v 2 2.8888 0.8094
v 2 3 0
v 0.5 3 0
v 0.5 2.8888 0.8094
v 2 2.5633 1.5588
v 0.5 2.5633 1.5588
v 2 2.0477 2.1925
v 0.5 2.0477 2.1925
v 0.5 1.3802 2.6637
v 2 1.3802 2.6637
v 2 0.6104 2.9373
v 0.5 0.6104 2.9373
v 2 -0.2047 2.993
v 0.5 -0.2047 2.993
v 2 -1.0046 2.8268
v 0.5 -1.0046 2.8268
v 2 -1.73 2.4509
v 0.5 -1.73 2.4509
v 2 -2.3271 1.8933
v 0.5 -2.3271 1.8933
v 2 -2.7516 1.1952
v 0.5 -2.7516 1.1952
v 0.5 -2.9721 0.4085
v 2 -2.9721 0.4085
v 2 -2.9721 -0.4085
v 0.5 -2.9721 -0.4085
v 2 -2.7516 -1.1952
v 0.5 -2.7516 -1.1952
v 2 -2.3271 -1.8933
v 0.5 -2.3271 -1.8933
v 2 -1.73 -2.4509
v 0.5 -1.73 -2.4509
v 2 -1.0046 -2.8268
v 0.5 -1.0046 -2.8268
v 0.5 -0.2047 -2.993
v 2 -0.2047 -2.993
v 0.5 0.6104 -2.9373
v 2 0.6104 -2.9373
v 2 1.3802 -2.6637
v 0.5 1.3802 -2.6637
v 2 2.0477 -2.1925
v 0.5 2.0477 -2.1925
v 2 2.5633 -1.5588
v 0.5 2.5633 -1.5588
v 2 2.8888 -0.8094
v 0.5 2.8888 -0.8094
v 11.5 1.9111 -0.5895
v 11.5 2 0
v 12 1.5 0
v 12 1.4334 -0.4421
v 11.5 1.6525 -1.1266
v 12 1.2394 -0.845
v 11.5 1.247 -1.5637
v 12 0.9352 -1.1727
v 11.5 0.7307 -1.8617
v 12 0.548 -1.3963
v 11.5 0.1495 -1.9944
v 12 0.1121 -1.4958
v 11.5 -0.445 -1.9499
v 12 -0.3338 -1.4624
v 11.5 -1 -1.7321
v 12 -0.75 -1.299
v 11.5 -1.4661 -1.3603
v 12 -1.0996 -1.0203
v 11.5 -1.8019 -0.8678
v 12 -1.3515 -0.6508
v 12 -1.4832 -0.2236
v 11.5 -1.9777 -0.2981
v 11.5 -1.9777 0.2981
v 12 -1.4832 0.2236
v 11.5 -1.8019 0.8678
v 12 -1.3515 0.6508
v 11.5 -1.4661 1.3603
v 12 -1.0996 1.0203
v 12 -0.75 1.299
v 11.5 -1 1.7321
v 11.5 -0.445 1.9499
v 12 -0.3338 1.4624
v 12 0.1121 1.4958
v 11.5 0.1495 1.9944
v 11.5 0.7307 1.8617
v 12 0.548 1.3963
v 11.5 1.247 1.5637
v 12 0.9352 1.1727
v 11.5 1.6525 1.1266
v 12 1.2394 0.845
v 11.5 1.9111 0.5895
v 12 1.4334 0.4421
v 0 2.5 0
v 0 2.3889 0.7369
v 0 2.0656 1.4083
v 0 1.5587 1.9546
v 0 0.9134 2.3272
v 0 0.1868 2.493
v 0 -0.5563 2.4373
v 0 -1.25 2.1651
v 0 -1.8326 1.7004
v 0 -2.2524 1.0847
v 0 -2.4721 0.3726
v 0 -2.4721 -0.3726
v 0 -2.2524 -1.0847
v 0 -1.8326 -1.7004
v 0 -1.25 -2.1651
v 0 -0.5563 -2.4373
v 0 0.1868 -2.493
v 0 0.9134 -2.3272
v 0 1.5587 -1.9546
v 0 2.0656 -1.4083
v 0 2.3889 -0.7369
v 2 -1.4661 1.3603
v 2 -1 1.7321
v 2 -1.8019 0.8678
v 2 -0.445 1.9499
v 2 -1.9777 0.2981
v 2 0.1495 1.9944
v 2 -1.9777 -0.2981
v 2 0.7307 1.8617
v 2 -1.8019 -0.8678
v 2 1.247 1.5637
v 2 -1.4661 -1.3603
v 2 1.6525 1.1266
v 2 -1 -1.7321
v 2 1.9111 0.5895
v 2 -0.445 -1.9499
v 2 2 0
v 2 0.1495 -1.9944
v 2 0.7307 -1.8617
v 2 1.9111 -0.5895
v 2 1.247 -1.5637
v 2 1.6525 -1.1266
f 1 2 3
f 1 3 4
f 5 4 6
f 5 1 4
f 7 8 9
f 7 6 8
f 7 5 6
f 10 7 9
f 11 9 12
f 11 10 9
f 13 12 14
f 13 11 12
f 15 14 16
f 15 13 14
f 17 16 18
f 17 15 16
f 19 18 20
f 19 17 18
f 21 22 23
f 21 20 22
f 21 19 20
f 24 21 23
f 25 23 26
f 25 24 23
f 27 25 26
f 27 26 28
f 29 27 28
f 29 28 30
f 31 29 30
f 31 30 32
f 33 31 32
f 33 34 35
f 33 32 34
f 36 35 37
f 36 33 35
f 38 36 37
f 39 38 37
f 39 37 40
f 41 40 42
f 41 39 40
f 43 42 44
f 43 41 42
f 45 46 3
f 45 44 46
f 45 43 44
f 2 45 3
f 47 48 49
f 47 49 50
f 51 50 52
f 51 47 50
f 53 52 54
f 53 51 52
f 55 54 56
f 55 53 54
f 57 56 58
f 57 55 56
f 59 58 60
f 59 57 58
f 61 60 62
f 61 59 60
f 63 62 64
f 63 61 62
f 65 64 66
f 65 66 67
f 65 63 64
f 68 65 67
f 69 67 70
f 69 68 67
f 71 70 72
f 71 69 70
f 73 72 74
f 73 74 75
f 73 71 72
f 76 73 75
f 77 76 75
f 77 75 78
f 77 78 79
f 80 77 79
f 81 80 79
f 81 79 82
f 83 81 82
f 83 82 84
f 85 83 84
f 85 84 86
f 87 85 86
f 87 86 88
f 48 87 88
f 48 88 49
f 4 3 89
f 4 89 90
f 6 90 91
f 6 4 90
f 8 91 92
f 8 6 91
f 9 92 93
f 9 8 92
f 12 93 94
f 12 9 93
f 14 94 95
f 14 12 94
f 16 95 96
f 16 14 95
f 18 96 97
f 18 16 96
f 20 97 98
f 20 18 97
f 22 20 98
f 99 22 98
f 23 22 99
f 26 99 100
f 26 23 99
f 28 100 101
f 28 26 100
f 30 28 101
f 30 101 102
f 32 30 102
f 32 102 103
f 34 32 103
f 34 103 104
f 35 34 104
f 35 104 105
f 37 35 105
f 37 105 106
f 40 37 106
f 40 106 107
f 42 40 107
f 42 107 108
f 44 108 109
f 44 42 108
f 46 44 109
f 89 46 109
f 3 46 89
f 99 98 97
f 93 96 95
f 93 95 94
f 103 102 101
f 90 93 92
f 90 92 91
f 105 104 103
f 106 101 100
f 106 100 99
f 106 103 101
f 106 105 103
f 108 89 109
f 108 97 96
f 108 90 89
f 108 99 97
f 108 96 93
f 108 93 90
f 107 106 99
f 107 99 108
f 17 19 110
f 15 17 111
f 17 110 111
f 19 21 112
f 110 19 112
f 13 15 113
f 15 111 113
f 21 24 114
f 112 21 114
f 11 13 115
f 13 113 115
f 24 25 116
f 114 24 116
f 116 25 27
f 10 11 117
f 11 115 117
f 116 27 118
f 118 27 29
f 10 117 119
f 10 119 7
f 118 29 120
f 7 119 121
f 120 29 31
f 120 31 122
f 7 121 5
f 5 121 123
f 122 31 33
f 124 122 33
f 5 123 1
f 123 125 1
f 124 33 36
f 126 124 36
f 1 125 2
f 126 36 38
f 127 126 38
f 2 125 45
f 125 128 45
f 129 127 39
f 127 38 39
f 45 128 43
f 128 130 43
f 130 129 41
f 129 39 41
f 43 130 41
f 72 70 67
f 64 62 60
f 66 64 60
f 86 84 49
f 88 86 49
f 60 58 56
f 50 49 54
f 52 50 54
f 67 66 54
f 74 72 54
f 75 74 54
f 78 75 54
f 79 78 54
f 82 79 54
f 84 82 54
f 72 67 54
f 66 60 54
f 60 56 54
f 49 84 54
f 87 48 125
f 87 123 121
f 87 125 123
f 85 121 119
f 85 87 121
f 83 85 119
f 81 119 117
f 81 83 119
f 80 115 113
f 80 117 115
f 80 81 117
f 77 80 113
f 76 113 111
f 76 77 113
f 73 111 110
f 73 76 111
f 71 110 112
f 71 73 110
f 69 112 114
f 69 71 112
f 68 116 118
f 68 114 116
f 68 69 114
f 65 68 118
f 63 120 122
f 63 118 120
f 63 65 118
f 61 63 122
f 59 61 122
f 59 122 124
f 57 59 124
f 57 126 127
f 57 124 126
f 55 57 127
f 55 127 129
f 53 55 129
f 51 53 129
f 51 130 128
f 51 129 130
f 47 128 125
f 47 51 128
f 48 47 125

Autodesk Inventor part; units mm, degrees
ref_plane "YZ Plane" through (0, 0, 0) normal (1, 0, 0) x (0, 1, 0)
ref_plane "XZ Plane" through (0, 0, 0) normal (0, 1, 0) x (-1, 0, 0)
ref_plane "XY Plane" through (0, 0, 0) normal (0, 0, 1) x (1, 0, 0)
sketch "Sketch1" plane through (0, 0, 0) normal (0, 0, 1) x (1, 0, 0)
  line L0 (0, 0) -> (0, 3)
  line L1 (0, 3) -> (2, 3)
  line L2 (2, 3) -> (2, 2)
  line L3 (2, 2) -> (12, 2)
  line L4 (12, 2) -> (12, 0)
  line L5 (12, 0) -> (0, 0)
  point P0 (1, 3)
  point P1 (0, 1.5)
  point P2 (2, 2.5)
  dimension "d0" = 6
  dimension "d1" = 4
  dimension "d2" = 12
  dimension "d3" = 2
revolve "Revolution1" add sketch "Sketch1" angle 360 about axis through (12, 0, 0) along (-1, 0, 0)
chamfer "Chamfer1" distance 0.5 angle 45 2 edges at (0, -3, 0) (12, -2, 0)
properties part number "Axle" material "Steel"
